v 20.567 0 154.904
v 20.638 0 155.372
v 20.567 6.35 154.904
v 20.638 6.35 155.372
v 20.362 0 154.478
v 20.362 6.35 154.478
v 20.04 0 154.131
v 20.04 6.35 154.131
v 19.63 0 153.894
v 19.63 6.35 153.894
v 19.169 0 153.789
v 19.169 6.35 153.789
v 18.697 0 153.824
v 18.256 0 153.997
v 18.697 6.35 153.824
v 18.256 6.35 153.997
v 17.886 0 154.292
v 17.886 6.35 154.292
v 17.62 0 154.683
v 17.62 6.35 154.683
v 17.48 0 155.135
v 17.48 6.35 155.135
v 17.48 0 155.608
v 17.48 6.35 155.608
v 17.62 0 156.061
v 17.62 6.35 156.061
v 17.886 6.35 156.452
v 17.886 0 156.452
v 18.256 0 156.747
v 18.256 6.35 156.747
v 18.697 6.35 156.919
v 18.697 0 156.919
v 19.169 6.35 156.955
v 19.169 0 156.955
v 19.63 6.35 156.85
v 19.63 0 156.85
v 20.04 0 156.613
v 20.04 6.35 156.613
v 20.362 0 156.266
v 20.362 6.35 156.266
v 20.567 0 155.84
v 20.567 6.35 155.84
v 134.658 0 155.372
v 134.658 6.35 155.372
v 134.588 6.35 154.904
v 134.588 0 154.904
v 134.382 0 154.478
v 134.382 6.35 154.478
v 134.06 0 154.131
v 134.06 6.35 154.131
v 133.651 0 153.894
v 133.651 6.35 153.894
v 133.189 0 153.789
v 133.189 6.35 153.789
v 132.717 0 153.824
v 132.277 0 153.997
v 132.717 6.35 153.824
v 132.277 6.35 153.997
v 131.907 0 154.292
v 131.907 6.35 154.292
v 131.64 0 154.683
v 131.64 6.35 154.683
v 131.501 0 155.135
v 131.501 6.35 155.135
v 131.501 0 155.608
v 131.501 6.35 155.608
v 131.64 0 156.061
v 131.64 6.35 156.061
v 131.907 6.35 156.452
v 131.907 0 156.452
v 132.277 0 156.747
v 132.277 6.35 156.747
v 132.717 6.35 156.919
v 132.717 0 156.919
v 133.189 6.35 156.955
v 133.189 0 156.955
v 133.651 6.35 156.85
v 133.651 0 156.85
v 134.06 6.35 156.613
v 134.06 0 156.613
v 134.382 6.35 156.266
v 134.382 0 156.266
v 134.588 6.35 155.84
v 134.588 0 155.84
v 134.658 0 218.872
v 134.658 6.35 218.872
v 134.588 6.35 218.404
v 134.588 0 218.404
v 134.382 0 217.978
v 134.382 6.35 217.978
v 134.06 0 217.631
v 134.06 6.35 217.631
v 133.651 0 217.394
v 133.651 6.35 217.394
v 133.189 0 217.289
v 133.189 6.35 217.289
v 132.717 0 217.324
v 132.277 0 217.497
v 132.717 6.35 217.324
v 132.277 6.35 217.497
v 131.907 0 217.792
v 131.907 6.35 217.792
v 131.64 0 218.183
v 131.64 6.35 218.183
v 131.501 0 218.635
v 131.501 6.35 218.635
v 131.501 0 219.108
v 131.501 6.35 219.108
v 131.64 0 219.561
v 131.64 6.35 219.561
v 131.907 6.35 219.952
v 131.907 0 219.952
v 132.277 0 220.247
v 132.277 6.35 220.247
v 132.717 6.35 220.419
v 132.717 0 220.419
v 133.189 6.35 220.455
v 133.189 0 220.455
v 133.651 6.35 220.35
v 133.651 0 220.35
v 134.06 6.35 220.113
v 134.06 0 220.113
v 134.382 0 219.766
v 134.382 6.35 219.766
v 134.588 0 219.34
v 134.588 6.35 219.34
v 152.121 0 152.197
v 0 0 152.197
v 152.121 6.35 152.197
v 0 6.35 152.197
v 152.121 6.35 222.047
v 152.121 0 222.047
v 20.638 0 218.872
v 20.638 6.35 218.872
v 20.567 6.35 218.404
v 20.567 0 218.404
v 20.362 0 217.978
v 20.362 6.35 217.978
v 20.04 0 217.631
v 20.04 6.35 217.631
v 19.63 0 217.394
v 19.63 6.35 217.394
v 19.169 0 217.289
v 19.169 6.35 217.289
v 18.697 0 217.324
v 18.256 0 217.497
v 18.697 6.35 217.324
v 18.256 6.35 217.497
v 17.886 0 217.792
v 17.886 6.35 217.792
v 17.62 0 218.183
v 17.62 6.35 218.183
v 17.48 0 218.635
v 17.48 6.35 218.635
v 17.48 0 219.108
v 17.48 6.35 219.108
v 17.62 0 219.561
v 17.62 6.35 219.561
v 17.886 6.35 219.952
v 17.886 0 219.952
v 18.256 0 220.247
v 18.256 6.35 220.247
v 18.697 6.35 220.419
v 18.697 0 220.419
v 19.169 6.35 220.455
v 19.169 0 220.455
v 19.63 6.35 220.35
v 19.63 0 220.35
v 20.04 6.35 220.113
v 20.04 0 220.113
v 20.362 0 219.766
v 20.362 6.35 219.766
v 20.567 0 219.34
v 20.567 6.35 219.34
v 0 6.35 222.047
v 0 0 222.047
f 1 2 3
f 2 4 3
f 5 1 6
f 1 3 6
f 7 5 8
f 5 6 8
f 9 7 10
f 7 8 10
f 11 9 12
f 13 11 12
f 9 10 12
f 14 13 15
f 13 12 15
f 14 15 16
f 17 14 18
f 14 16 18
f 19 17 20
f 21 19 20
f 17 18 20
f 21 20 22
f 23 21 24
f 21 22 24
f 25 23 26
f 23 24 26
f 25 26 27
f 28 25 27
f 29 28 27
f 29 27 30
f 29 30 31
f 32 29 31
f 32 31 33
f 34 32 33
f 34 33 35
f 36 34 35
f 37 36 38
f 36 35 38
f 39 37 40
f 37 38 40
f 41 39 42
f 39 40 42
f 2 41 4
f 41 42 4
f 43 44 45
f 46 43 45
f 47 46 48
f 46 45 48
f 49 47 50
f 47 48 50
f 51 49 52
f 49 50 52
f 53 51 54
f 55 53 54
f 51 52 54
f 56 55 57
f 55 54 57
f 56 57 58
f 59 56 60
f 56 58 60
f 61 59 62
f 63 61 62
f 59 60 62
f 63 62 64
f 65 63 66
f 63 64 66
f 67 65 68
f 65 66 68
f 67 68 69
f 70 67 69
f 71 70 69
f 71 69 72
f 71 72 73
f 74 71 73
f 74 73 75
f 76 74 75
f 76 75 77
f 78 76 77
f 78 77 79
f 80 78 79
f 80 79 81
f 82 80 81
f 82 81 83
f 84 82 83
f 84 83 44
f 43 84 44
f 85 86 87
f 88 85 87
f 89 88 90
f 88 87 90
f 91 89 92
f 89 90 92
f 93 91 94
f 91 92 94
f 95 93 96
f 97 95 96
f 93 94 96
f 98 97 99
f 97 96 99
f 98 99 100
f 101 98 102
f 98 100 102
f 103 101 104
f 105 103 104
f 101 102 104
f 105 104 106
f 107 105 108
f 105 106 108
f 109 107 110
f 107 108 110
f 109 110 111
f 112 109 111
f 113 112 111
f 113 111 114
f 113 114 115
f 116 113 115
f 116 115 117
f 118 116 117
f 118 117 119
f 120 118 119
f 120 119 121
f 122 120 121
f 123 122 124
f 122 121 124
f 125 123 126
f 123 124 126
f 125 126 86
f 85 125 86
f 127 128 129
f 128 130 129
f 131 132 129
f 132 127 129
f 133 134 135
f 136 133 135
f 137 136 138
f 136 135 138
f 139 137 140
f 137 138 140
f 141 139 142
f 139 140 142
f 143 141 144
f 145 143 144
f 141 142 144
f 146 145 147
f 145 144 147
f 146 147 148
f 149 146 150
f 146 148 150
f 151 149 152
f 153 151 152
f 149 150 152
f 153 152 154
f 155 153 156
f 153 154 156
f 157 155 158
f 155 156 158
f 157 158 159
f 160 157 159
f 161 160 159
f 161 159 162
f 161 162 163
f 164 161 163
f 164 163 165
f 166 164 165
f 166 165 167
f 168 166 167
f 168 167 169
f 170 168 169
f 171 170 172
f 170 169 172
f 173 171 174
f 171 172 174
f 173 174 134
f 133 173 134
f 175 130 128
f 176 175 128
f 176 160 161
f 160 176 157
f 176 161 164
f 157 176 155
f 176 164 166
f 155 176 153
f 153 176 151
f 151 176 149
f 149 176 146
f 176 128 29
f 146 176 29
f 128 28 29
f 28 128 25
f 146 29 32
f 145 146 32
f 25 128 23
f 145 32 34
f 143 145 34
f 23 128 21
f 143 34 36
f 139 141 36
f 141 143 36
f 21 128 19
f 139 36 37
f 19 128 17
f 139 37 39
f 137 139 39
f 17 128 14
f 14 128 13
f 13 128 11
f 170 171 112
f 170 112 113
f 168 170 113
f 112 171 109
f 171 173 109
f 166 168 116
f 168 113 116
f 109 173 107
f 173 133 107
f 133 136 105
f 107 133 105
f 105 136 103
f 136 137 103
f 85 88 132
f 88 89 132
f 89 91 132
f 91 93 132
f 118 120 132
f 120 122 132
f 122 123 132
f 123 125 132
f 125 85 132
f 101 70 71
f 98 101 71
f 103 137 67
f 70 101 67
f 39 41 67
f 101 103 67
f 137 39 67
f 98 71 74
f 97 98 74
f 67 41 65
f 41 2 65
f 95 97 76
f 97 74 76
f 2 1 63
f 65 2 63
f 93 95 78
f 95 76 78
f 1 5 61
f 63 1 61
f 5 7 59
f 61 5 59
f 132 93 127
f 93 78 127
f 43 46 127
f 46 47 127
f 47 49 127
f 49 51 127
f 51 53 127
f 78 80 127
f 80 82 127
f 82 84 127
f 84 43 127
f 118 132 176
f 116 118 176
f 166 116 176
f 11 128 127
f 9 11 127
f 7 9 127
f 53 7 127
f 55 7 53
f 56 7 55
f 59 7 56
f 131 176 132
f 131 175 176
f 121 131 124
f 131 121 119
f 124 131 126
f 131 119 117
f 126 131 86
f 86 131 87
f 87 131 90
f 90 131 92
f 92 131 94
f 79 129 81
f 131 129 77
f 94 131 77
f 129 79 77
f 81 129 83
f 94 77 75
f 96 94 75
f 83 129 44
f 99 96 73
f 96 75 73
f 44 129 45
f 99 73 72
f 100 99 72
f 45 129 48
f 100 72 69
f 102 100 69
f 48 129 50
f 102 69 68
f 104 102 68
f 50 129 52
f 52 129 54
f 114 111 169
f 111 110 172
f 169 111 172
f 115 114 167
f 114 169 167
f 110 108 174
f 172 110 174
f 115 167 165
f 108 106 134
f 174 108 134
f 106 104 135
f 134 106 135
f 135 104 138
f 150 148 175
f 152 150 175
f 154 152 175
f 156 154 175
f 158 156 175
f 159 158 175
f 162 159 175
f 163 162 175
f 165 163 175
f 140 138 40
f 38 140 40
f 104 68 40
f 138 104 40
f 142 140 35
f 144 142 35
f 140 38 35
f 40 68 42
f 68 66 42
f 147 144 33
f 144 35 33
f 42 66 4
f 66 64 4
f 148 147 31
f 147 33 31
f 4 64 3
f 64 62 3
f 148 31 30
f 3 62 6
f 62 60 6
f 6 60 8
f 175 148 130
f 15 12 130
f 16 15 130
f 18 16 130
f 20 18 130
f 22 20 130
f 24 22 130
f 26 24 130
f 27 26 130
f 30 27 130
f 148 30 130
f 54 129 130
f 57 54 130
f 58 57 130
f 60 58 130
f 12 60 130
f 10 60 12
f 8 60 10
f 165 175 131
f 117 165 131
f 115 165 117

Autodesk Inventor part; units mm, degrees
ref_plane "YZ Plane" through (0, 0, 0) normal (1, 0, 0) x (0, 1, 0)
ref_plane "XZ Plane" through (0, 0, 0) normal (0, 1, 0) x (-1, 0, 0)
ref_plane "XY Plane" through (0, 0, 0) normal (0, 0, 1) x (1, 0, 0)
ref_plane "Work Plane1" through (0, 0, 152.1968) normal (0, 0, 1) x (1, 0, 0)
sketch "Sketch2" plane through (0, 0, 152.1968) normal (0, 0, 1) x (1, 0, 0)
  line L0 (0, 0) -> (152.1206, 0)
  line L1 (152.1206, 0) -> (152.1206, 6.35)
  line L2 (152.1206, 6.35) -> (0, 6.35)
  line L3 (0, 6.35) -> (0, 0)
  dimension "d20" = 152.1206
  dimension "d21" = 6.35
extrude "Extrusion2" add sketch "Sketch2" along normal blind 69.85
sketch "Sketch4" plane through (0, 6.35, 152.1968) normal (0, 1, 0) x (1, 0, 0)
  circle A0 centre (19.05, -3.175) radius 1.5875
  circle A1 centre (133.0706, -3.175) radius 1.5875
  circle A2 centre (133.0706, -66.675) radius 1.5875
  circle A3 centre (19.05, -66.675) radius 1.5875
  line L0 (0, 0) -> (0, -69.85) projected
  line L1 (152.1206, 0) -> (0, 0) projected
  line L2 (152.1206, 0) -> (152.1206, -69.85) projected
  line L3 (152.1206, -69.85) -> (0, -69.85) projected
  point P0 (0, 152.1968)
  dimension "d22" = 3.175
  dimension "d23" = 19.05
  dimension "d24" = 3.175
  dimension "d25" = 19.05
  dimension "d26" = 3.175
extrude "Extrusion4" cut sketch "Sketch4" against normal blind 152.1968 contours A0 | A1 | A2 | A3
properties part number "Base"
